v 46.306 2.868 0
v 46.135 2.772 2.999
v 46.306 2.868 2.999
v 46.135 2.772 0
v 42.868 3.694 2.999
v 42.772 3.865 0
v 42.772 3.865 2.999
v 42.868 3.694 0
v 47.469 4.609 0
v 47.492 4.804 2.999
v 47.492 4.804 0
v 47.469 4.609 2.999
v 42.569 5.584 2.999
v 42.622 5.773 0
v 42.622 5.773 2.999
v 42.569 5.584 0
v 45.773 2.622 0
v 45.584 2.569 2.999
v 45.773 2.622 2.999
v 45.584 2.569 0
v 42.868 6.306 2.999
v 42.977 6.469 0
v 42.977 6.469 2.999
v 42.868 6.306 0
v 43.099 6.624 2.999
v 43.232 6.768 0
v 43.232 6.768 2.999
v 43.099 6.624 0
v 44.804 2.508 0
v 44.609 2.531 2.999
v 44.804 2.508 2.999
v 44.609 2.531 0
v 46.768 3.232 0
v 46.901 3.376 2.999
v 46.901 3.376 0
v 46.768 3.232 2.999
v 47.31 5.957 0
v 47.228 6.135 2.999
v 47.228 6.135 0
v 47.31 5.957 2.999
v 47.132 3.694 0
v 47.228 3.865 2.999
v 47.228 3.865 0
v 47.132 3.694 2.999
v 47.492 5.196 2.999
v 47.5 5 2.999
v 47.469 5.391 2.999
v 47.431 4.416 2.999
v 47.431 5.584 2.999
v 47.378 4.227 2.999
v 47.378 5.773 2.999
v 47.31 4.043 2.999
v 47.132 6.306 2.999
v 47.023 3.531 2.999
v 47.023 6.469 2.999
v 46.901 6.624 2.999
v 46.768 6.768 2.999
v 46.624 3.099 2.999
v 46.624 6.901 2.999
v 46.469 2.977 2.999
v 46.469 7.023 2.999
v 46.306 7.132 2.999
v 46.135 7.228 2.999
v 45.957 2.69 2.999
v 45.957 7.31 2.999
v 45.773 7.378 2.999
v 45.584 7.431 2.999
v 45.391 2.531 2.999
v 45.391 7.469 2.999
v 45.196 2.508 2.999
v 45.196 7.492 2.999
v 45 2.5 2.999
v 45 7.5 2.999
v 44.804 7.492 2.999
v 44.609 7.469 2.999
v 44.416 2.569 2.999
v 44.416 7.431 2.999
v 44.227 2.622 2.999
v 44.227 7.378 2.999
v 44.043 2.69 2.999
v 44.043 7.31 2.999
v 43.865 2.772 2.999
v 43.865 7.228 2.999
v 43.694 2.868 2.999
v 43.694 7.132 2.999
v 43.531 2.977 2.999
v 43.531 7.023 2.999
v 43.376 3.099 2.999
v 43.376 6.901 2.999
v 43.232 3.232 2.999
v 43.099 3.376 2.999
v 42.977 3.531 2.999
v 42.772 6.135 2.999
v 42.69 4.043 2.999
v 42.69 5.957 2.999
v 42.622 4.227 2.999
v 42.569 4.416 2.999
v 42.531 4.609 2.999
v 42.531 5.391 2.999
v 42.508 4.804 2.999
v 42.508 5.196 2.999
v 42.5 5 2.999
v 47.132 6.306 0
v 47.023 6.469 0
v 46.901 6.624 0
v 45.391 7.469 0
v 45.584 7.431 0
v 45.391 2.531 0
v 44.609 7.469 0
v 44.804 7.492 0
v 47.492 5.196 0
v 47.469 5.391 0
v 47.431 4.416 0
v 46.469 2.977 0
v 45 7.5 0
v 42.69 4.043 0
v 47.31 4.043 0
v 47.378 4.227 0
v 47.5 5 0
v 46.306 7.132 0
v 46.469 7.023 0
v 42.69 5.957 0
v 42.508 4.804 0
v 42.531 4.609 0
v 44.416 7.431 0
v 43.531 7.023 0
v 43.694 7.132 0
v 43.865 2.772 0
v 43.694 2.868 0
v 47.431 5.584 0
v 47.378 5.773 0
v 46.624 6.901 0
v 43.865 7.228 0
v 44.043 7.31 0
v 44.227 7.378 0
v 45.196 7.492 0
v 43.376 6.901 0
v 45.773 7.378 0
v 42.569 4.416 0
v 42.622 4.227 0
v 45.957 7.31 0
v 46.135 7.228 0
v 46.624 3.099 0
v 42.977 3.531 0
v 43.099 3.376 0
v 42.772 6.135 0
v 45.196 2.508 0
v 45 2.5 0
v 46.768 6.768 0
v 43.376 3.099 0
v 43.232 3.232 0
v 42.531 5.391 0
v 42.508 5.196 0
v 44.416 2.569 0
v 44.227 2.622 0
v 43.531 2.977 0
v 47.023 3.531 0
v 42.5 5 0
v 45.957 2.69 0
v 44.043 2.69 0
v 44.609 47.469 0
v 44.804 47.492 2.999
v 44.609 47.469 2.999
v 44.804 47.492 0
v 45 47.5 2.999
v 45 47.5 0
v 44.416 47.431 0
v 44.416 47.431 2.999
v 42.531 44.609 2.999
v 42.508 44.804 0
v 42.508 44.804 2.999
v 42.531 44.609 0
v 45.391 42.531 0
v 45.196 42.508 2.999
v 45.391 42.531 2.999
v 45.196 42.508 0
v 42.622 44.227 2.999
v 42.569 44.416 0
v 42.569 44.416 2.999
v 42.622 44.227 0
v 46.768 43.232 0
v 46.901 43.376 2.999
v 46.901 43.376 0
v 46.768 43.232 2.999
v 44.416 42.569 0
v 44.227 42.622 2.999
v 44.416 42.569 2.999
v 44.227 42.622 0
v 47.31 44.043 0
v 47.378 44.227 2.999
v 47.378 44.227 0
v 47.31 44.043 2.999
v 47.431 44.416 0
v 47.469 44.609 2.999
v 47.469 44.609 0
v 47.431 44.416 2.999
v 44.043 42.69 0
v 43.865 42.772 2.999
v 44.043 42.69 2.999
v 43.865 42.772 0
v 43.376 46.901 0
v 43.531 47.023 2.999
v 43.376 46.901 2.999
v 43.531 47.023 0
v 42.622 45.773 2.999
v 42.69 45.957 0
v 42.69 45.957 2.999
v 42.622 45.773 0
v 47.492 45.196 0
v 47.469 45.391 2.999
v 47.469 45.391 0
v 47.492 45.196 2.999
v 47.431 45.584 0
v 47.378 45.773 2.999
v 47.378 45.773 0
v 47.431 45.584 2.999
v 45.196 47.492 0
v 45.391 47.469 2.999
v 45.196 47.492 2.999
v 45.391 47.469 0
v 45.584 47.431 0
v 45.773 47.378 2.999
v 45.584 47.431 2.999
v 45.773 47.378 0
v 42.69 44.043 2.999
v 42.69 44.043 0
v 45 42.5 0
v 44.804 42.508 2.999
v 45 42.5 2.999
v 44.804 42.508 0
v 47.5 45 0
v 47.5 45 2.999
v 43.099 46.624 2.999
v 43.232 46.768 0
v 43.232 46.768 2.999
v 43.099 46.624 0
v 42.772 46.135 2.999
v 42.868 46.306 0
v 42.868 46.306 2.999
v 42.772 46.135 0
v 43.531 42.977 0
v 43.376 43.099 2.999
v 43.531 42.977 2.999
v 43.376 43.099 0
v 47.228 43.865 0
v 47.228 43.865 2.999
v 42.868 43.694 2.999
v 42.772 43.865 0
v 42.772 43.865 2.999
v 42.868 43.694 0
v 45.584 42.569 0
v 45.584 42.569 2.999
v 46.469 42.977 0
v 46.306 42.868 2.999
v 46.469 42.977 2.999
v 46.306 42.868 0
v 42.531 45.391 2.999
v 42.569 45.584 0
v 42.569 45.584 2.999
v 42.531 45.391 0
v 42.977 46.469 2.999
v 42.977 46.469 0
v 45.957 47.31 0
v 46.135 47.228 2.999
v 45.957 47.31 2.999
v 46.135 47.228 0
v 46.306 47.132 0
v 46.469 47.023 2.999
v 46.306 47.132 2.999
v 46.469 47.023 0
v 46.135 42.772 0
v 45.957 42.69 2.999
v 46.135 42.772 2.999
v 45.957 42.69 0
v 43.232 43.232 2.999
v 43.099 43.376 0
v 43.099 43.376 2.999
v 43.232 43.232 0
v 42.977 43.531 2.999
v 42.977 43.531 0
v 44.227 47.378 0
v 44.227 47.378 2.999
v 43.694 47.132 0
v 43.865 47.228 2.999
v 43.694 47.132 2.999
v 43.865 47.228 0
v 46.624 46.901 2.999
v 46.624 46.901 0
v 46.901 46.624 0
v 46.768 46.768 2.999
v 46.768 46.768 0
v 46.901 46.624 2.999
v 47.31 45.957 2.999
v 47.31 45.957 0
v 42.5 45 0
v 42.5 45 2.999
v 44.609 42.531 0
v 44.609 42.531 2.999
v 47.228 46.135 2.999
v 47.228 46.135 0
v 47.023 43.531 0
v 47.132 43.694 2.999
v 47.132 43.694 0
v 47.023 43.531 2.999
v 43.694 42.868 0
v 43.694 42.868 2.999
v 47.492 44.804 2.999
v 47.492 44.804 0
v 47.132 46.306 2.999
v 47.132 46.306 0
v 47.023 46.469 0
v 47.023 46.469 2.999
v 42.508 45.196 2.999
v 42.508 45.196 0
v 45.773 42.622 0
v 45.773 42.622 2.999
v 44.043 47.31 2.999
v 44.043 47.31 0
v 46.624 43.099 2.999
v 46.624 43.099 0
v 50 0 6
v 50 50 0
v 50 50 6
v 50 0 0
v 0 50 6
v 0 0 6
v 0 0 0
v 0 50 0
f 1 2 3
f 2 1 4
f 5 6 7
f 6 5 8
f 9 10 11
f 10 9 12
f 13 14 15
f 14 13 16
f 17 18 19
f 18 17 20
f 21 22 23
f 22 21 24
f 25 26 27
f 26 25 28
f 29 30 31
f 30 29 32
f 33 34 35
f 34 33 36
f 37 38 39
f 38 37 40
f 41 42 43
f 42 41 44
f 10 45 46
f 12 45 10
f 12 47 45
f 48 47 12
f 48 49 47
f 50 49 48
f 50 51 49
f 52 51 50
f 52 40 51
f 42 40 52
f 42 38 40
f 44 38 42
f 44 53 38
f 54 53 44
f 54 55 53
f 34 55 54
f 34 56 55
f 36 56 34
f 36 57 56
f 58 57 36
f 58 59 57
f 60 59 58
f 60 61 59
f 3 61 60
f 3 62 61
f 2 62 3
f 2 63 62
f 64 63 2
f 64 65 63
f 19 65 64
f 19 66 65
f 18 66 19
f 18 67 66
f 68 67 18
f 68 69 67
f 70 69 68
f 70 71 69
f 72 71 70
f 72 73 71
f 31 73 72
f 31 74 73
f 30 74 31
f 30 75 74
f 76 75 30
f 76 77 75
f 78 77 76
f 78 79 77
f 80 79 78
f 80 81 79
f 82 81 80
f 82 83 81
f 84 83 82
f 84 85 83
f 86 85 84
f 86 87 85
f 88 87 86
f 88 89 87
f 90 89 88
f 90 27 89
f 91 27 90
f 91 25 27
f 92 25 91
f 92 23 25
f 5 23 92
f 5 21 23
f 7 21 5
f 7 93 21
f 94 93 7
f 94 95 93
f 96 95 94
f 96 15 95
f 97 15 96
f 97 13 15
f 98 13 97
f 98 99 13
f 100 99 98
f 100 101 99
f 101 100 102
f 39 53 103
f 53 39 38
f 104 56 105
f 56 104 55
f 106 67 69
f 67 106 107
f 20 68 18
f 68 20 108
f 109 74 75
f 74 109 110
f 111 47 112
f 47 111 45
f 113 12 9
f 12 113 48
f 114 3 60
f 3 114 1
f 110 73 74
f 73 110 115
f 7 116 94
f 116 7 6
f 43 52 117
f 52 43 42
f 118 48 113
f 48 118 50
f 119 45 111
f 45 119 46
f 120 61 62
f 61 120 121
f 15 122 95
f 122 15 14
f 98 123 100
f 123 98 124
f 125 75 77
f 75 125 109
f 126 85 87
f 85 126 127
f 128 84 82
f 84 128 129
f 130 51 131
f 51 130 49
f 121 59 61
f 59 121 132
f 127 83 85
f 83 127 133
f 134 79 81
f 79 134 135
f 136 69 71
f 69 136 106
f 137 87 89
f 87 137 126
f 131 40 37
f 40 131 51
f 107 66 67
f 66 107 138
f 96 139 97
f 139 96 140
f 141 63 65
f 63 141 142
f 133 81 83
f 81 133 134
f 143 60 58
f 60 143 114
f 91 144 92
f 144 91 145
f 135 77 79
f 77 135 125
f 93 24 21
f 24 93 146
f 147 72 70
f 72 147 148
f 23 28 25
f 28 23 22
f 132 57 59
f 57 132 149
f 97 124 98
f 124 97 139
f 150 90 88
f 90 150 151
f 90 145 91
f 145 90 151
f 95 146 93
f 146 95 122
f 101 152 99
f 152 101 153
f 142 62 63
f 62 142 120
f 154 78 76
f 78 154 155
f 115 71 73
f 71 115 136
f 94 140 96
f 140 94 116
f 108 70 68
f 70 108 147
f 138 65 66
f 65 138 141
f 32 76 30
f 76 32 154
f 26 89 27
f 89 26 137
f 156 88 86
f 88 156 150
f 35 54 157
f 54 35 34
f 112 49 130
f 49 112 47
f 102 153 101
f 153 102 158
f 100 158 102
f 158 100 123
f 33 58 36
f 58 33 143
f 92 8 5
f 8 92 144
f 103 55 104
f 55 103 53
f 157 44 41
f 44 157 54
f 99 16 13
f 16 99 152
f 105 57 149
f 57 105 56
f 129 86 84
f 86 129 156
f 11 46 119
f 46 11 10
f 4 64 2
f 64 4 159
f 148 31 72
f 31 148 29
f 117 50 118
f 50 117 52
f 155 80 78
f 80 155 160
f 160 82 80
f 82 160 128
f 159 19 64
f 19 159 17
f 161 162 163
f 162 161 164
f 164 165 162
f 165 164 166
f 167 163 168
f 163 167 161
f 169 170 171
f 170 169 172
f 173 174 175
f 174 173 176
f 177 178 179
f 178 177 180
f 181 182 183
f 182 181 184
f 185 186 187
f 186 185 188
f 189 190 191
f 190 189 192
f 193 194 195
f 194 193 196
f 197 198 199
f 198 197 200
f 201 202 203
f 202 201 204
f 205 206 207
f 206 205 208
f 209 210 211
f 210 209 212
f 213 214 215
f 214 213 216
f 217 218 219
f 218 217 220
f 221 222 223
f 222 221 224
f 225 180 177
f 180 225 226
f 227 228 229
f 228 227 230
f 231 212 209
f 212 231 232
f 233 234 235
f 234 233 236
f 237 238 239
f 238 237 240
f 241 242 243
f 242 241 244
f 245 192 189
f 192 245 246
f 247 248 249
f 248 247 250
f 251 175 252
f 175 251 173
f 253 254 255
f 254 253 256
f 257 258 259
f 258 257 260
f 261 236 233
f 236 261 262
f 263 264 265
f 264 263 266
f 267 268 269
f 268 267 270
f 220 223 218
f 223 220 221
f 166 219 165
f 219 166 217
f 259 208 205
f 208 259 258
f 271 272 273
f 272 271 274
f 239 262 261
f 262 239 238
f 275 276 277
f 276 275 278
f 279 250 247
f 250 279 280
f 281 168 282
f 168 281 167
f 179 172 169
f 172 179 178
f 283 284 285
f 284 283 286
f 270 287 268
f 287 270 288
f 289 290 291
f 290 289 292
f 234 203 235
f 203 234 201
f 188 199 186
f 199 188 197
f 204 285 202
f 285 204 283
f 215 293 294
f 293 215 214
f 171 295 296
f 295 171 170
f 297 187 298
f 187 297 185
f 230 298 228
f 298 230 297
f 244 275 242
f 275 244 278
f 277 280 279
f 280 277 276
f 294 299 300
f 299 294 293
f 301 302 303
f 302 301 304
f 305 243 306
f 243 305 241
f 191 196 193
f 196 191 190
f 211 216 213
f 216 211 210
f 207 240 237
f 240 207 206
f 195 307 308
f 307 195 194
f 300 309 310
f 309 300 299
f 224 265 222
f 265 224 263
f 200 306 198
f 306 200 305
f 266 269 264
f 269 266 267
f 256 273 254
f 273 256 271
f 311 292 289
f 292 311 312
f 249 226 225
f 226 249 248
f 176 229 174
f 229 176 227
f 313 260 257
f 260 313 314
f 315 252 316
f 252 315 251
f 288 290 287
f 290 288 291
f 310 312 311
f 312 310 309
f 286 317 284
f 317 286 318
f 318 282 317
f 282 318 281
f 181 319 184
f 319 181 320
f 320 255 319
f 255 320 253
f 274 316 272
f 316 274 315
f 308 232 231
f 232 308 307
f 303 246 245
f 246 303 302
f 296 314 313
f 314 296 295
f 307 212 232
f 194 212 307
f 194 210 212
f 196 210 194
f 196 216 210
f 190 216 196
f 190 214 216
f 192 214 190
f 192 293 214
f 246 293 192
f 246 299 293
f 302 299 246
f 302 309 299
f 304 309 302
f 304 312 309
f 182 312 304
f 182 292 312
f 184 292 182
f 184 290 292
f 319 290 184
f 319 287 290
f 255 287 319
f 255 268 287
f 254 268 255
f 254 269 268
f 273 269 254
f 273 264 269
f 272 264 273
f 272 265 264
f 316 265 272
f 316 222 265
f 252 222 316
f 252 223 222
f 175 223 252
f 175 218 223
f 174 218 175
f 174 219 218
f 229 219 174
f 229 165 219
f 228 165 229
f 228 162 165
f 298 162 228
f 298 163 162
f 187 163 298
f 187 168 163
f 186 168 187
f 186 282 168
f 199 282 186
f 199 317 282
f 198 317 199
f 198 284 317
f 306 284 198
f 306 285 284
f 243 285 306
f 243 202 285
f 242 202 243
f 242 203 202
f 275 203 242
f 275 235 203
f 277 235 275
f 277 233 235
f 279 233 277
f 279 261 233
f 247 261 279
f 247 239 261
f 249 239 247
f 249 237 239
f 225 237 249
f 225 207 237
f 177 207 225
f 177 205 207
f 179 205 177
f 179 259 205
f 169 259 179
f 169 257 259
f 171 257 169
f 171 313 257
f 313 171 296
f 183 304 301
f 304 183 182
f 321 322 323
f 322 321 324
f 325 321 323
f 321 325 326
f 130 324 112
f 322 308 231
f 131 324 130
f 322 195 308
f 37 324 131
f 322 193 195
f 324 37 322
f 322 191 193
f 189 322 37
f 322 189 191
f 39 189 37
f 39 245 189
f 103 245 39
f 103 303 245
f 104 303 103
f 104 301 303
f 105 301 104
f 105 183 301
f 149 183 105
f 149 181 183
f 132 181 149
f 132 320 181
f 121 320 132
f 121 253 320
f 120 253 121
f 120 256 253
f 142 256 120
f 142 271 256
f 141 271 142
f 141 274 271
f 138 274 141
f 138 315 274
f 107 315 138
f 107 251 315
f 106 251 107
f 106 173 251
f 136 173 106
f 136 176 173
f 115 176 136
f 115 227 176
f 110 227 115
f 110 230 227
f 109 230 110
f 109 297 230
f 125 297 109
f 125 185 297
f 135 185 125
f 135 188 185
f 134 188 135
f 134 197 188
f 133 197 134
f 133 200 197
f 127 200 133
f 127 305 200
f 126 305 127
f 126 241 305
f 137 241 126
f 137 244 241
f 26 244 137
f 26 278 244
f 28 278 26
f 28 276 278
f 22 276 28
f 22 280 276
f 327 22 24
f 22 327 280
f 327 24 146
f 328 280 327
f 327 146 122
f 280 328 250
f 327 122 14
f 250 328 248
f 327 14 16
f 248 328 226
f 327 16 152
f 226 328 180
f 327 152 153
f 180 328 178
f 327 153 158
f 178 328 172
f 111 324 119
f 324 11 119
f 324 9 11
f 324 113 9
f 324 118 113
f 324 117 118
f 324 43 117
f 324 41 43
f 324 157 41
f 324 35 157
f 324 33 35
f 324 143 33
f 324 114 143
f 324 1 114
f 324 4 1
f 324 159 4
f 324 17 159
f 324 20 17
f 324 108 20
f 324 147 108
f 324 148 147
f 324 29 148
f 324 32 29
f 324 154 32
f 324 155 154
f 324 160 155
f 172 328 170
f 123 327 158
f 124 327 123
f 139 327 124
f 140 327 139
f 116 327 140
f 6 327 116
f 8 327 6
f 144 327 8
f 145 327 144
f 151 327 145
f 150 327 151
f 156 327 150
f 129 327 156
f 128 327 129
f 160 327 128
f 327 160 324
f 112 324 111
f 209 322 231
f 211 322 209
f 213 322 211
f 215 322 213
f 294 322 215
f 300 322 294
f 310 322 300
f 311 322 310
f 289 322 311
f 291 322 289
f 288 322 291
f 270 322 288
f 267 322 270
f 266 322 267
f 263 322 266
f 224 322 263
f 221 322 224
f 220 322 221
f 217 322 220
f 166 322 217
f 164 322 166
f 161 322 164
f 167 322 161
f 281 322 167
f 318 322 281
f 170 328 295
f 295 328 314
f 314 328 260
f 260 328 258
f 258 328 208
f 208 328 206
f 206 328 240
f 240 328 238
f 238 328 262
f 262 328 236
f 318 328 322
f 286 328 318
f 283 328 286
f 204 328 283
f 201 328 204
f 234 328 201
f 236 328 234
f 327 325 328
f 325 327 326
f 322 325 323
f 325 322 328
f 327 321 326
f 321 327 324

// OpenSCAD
// file: Modules.scad
/*
 * Jig to hold a model airplane while working on it.
 *
 * Vertical sections slide horizonally. Horizontal dimensions are scalable
 * by adding one or more extension bars.
 *
 * Wing supports clamp magnetically. Be sure to glue some felt on the
 * insides of the wing supports to protect the model
 *
 * ©Louis Kowolowski 2020
 */

module tail_holder () {
	translate ([3*bar_w, 0, 10]) {
		rotate ([0, 180, 0]) {
			tail_holder_bottom ();
		}
	}
	// height is +5 (thickness of top) because its been flipped over
	translate ([0, 0, -7]) {
		tail_holder_top ();
	}
}

module tail_holder_bottom () {
	difference () {
		cube ([3*bar_w, 1.5*bar_screw_head_d, bar_w/4]);

		union () {
			// screw/nut hole
			translate ([1.5*bar_w, 1.5*bar_screw_head_d+0.001, bar_w/8]) {
				rotate ([90, 0, 0]) {
					bar_screw ();
				}
			}
			// left magnet hole
			translate ([0.75*bar_screw_head_d, 1.5*bar_screw_d, bar_w/4-magnet_h+0.001]) {
				cylinder (magnet_h, d=magnet_d, $fn=80);
			}
			// right magnet hole
			translate ([(3*bar_w)-(0.75*bar_screw_head_d), 1.5*bar_screw_d, bar_w/4-magnet_h+0.001]) {
				cylinder (magnet_h, d=magnet_d, $fn=80);
			}
		}
	}
	// left side
	translate ([0, 1.5*bar_screw_head_d, 0]) {
		cube ([bar_w, bar_w, 5]);
	}

	// right side
	translate ([2*bar_w, 1.5*bar_screw_head_d, 0]) {
		cube ([bar_w, bar_w, 5]);
	}

}

module tail_holder_top () {

	difference () {
		cube ([3*bar_w, 1.5*bar_screw_head_d, 5]);
		union () {
			// left magnet hole
			translate ([0.75*bar_screw_head_d, 1.5*bar_screw_d, 5.001-magnet_h]) {
				cylinder (magnet_h, d=magnet_d, $fn=80);
			}
			// right magnet hole
			translate ([(3*bar_w)-(0.75*bar_screw_head_d), 1.5*bar_screw_d, 5.001-magnet_h]) {
				cylinder (magnet_h, d=magnet_d, $fn=80);
			}
		}
	}
	// left side
	translate ([0, 1.5*bar_screw_head_d, 0]) {
		cube ([bar_w, bar_w, 5]);
	}

	// right side
	translate ([2*bar_w, 1.5*bar_screw_head_d, 0]) {
		cube ([bar_w, bar_w, 5]);
	}
}

module nose_holder () {
	difference () {
		union () {
			cube ([bar_w, bar_w, 6]);
			translate ([0, 0, 6]) {
				// rear block to house screw/nut holder and magnets for top
				cube ([bar_screw_head_d, bar_w, 1.5*bar_screw_head_d]);
			}
			translate ([0, 0, 6]) {
				// rear block to house screw/nut holder and magnets for top
				cube ([bar_w, bar_w, 1.5*bar_screw_head_d]);
			}
		}
		union () {
			// screw/nut hole
			translate ([bar_screw_head_d+1, bar_w/2, 10]) {
				rotate ([0, 270, 0]) {
					bar_screw ();
				}
			}
			// angled cut to hold nose centered in jib
			translate ([bar_w/2+.5*bar_screw_head_d+0.001, bar_w/2, bar_w/2-5]) {
				rotate ([270, 210, 90]) {
					Triangle(a=bar_w, b=bar_w, angle=120, height=bar_w-bar_screw_head_d+0.001, centerXYZ=[true,true,true]);
				}
			}
			
		}
	}
}


module wing_holder () {
	wing_holder_bottom ();

	translate ([0, 0, 1.5*bar_screw_head_d+2]) {
		wing_holder_top ();
	}
}

module wing_holder_bottom () {
	// slides up and down the riser to hold the wing at the correct height
	difference () {
		union () {
			cube ([bar_w, bar_w, 6]);
			translate ([0, 0, 6]) {
				// rear block to house screw/nut holder and magnets for top
				// add 1 to height for room above the nut
				cube ([bar_screw_head_d, bar_w, bar_screw_head_d+1]);
			}
		}
		union () {
			// screw/nut hole
			translate ([bar_screw_head_d+1, bar_w/2, 11]) {
				rotate ([0, 270, 0]) {
					bar_screw ();
				}
			}
			// magnet mounting holes
			translate ([magnet_d/2+2, magnet_d, bar_screw_head_d+4.001]) {
				rotate ([0, 0, 90]) {
					cylinder (magnet_h, d=magnet_d, $fn=80);
				}
			}
			// magnet mounting holes
			translate ([magnet_d/2+2, bar_w-magnet_d, bar_screw_head_d+4.001]) {
				rotate ([0, 0, 90]) {
					cylinder (magnet_h, d=magnet_d, $fn=80);
				}
			}
		}
	}
}

module wing_holder_top () {
	difference () {
		cube ([bar_w, bar_w, 6]);
		union () {
			// magnet mounting holes
			translate ([bar_w-magnet_d, magnet_d, -1*0.001]) {
				rotate ([0, 0, 90]) {
					cylinder (magnet_h, d=magnet_d, $fn=80);
				}
			}
			// magnet mounting holes
			translate ([bar_w-magnet_d, bar_w-magnet_d, -1*0.001]) {
				rotate ([0, 0, 90]) {
					cylinder (magnet_h, d=magnet_d, $fn=80);
				}
			}
		}
	}
}

module riser () {
	/* vertical bar that will slide forward/backward on the base and hold the
	 * horizontal rest(s) for the model
	 */
	difference () {
		// base
		cube ([riser_w, riser_w, riser_w/4]);	
		union () {
			// slot at bottom for guide on bar
			translate ([riser_w/4, -1*0.001, -1*0.01]) {
				cube ([riser_w/2, riser_w+1, 5.01]);
			}
			// cross slot at bottom for guide on bar
			translate ([-0.001, riser_w/4, -1*0.01]) {
				cube ([riser_w+1, riser_w/2, 5.01]);
			}
			// screw hole
			translate ([riser_w/2, riser_w/2, -1*bar_screw_head_h]) {
				bar_screw ();
			}
		}
	}
	difference () {
		// vartical riser
		translate ([0, 0, riser_w/4]) {
			cube ([riser_w, riser_w/8, riser_l]);
		}
		// screw slot
		translate ([riser_w/2-bar_screw_d/2, -1, riser_w]) {
			cube ([bar_screw_d, riser_w/4+1, riser_l-riser_w]);
		}
	}
}

module bar_screw () {
	// Model of a screw and hex head/nut

	// screw head
	cylinder(bar_screw_head_h, d=bar_screw_head_d, $fn=6);
	translate ([0, 0, 0]) {
		// screw body
		cylinder(bar_screw_h, d=bar_screw_d, $fn=80);
	}
}

module bar () {
	/* lower base unit. Comes together as a cross. Each bar can be extended with
	 * additional bars.
	 * Raised section acts as a guide for the riser. Slot down the middle is for
	 * a clamping butterfly screw.
	 */
	difference () {
		union () {
			cube ([bar_l, bar_w, bar_h]);
			translate ([0, bar_w/4, 0]) {
				// guide slot
				cube ([bar_l, bar_w/2, bar_h+5]);
			}
		}
		translate ([1, bar_w/2-bar_screw_d/2, -0.001]) {
			cube ([bar_l-2, bar_screw_d, bar_screw_h]);
		}
		translate ([1, bar_w/2-bar_screw_head_d/2, -0.001]) {
			 cube ([bar_l, bar_screw_head_d, bar_screw_head_h+1]);
		}
	}
	// upper extension
	difference () {
		translate ([bar_l, 0, bar_h/2]) {
			cube ([bar_w/4, bar_w, bar_h/2]);
		}
		union () {
			// 2 screw holes
			// left
			translate ([bar_l+bar_w/8, bar_w/8, -1*0.001]) {
				bar_screw ();
			}
			// right
			translate ([bar_l+bar_w/8, bar_w-bar_w/8, -1*0.001]) {
				bar_screw ();
			}
		}
	}
	// lower extension
	difference () {
		translate ([-1*bar_w/4, 0, 0]) {
			cube ([bar_w/4, bar_w, bar_h/2]);
		}
		union () {
			// 2 screw holes
			// left
			translate ([-1*bar_w/4+bar_w/8, bar_w/8, -1*0.001]) {
				bar_screw ();
			}
			// right
			translate ([-1*bar_w/4+bar_w/8, bar_w-bar_w/8, -1*0.001]) {
				bar_screw ();
			}
		}
	}

}

module Triangle(
			a, b, angle, height=1, heights=undef,
			center=undef, centerXYZ=[false,false,false]) {
	// Calculate Heights at each point
	heightAB = ((heights==undef) ? height : heights[0])/2;
	heightBC = ((heights==undef) ? height : heights[1])/2;
	heightCA = ((heights==undef) ? height : heights[2])/2;
	centerZ = (center || (center==undef && centerXYZ[2]))?0:max(heightAB,heightBC,heightCA);

	// Calculate Offsets for centering
	offsetX = (center || (center==undef && centerXYZ[0]))?((cos(angle)*a)+b)/3:0;
	offsetY = (center || (center==undef && centerXYZ[1]))?(sin(angle)*a)/3:0;
	
	pointAB1 = [-offsetX,-offsetY, centerZ-heightAB];
	pointAB2 = [-offsetX,-offsetY, centerZ+heightAB];
	pointBC1 = [b-offsetX,-offsetY, centerZ-heightBC];
	pointBC2 = [b-offsetX,-offsetY, centerZ+heightBC];
	pointCA1 = [(cos(angle)*a)-offsetX,(sin(angle)*a)-offsetY, centerZ-heightCA];
	pointCA2 = [(cos(angle)*a)-offsetX,(sin(angle)*a)-offsetY, centerZ+heightCA];

	polyhedron(
		points=[	pointAB1, pointBC1, pointCA1,
					pointAB2, pointBC2, pointCA2 ],
		faces=[	
			[0, 1, 2],
			[3, 5, 4],
			[0, 3, 1],
			[1, 3, 4],
			[1, 4, 2],
			[2, 4, 5],
			[2, 5, 0],
			[0, 5, 3] ] );
}
// file: Globals.scad
/*
 * Global variables used for all the models
 * All units are in mm
 *
 * Jig to hold a model airplane while working on it.
 *
 * Vertical sections slide horizonally. Horizontal dimensions are scalable
 * by adding one or more extension bars.
 *
 * Wing supports clamp magnetically. Be sure to glue some felt on the
 * insides of the wing supports to protect the model
 *
 * ©Louis Kowolowski 2020
 */

/* long dimensions are constrained by the size of the print bed
 */
bar_l = 175;
bar_w = 50;
bar_h = 13;

riser_l = 150;
riser_w = 50;
riser_h = 12;

// M5x20
bar_screw_head_h = 4.8;
bar_screw_head_d = 9.6;
bar_screw_h = 20;
bar_screw_d = 5;

guide_rail_l = bar_l;
guide_rail_w = bar_w/2;
guide_rail_h = 2;

magnet_h = 3;
magnet_d = 5;
// main file
/*
 * Jig to hold a model airplane while working on it.
 *
 * Vertical sections slide horizonally. Horizontal dimensions are scalable
 * by adding one or more extension bars.
 *
 * Wing supports clamp magnetically. Be sure to glue some felt on the
 * insides of the wing supports to protect the model
 *
 * ©Louis Kowolowski 2020
 */

/*
 * Include globals and modules
 */
include <Globals.scad>;
include <Modules.scad>;

wing_holder_top ();
